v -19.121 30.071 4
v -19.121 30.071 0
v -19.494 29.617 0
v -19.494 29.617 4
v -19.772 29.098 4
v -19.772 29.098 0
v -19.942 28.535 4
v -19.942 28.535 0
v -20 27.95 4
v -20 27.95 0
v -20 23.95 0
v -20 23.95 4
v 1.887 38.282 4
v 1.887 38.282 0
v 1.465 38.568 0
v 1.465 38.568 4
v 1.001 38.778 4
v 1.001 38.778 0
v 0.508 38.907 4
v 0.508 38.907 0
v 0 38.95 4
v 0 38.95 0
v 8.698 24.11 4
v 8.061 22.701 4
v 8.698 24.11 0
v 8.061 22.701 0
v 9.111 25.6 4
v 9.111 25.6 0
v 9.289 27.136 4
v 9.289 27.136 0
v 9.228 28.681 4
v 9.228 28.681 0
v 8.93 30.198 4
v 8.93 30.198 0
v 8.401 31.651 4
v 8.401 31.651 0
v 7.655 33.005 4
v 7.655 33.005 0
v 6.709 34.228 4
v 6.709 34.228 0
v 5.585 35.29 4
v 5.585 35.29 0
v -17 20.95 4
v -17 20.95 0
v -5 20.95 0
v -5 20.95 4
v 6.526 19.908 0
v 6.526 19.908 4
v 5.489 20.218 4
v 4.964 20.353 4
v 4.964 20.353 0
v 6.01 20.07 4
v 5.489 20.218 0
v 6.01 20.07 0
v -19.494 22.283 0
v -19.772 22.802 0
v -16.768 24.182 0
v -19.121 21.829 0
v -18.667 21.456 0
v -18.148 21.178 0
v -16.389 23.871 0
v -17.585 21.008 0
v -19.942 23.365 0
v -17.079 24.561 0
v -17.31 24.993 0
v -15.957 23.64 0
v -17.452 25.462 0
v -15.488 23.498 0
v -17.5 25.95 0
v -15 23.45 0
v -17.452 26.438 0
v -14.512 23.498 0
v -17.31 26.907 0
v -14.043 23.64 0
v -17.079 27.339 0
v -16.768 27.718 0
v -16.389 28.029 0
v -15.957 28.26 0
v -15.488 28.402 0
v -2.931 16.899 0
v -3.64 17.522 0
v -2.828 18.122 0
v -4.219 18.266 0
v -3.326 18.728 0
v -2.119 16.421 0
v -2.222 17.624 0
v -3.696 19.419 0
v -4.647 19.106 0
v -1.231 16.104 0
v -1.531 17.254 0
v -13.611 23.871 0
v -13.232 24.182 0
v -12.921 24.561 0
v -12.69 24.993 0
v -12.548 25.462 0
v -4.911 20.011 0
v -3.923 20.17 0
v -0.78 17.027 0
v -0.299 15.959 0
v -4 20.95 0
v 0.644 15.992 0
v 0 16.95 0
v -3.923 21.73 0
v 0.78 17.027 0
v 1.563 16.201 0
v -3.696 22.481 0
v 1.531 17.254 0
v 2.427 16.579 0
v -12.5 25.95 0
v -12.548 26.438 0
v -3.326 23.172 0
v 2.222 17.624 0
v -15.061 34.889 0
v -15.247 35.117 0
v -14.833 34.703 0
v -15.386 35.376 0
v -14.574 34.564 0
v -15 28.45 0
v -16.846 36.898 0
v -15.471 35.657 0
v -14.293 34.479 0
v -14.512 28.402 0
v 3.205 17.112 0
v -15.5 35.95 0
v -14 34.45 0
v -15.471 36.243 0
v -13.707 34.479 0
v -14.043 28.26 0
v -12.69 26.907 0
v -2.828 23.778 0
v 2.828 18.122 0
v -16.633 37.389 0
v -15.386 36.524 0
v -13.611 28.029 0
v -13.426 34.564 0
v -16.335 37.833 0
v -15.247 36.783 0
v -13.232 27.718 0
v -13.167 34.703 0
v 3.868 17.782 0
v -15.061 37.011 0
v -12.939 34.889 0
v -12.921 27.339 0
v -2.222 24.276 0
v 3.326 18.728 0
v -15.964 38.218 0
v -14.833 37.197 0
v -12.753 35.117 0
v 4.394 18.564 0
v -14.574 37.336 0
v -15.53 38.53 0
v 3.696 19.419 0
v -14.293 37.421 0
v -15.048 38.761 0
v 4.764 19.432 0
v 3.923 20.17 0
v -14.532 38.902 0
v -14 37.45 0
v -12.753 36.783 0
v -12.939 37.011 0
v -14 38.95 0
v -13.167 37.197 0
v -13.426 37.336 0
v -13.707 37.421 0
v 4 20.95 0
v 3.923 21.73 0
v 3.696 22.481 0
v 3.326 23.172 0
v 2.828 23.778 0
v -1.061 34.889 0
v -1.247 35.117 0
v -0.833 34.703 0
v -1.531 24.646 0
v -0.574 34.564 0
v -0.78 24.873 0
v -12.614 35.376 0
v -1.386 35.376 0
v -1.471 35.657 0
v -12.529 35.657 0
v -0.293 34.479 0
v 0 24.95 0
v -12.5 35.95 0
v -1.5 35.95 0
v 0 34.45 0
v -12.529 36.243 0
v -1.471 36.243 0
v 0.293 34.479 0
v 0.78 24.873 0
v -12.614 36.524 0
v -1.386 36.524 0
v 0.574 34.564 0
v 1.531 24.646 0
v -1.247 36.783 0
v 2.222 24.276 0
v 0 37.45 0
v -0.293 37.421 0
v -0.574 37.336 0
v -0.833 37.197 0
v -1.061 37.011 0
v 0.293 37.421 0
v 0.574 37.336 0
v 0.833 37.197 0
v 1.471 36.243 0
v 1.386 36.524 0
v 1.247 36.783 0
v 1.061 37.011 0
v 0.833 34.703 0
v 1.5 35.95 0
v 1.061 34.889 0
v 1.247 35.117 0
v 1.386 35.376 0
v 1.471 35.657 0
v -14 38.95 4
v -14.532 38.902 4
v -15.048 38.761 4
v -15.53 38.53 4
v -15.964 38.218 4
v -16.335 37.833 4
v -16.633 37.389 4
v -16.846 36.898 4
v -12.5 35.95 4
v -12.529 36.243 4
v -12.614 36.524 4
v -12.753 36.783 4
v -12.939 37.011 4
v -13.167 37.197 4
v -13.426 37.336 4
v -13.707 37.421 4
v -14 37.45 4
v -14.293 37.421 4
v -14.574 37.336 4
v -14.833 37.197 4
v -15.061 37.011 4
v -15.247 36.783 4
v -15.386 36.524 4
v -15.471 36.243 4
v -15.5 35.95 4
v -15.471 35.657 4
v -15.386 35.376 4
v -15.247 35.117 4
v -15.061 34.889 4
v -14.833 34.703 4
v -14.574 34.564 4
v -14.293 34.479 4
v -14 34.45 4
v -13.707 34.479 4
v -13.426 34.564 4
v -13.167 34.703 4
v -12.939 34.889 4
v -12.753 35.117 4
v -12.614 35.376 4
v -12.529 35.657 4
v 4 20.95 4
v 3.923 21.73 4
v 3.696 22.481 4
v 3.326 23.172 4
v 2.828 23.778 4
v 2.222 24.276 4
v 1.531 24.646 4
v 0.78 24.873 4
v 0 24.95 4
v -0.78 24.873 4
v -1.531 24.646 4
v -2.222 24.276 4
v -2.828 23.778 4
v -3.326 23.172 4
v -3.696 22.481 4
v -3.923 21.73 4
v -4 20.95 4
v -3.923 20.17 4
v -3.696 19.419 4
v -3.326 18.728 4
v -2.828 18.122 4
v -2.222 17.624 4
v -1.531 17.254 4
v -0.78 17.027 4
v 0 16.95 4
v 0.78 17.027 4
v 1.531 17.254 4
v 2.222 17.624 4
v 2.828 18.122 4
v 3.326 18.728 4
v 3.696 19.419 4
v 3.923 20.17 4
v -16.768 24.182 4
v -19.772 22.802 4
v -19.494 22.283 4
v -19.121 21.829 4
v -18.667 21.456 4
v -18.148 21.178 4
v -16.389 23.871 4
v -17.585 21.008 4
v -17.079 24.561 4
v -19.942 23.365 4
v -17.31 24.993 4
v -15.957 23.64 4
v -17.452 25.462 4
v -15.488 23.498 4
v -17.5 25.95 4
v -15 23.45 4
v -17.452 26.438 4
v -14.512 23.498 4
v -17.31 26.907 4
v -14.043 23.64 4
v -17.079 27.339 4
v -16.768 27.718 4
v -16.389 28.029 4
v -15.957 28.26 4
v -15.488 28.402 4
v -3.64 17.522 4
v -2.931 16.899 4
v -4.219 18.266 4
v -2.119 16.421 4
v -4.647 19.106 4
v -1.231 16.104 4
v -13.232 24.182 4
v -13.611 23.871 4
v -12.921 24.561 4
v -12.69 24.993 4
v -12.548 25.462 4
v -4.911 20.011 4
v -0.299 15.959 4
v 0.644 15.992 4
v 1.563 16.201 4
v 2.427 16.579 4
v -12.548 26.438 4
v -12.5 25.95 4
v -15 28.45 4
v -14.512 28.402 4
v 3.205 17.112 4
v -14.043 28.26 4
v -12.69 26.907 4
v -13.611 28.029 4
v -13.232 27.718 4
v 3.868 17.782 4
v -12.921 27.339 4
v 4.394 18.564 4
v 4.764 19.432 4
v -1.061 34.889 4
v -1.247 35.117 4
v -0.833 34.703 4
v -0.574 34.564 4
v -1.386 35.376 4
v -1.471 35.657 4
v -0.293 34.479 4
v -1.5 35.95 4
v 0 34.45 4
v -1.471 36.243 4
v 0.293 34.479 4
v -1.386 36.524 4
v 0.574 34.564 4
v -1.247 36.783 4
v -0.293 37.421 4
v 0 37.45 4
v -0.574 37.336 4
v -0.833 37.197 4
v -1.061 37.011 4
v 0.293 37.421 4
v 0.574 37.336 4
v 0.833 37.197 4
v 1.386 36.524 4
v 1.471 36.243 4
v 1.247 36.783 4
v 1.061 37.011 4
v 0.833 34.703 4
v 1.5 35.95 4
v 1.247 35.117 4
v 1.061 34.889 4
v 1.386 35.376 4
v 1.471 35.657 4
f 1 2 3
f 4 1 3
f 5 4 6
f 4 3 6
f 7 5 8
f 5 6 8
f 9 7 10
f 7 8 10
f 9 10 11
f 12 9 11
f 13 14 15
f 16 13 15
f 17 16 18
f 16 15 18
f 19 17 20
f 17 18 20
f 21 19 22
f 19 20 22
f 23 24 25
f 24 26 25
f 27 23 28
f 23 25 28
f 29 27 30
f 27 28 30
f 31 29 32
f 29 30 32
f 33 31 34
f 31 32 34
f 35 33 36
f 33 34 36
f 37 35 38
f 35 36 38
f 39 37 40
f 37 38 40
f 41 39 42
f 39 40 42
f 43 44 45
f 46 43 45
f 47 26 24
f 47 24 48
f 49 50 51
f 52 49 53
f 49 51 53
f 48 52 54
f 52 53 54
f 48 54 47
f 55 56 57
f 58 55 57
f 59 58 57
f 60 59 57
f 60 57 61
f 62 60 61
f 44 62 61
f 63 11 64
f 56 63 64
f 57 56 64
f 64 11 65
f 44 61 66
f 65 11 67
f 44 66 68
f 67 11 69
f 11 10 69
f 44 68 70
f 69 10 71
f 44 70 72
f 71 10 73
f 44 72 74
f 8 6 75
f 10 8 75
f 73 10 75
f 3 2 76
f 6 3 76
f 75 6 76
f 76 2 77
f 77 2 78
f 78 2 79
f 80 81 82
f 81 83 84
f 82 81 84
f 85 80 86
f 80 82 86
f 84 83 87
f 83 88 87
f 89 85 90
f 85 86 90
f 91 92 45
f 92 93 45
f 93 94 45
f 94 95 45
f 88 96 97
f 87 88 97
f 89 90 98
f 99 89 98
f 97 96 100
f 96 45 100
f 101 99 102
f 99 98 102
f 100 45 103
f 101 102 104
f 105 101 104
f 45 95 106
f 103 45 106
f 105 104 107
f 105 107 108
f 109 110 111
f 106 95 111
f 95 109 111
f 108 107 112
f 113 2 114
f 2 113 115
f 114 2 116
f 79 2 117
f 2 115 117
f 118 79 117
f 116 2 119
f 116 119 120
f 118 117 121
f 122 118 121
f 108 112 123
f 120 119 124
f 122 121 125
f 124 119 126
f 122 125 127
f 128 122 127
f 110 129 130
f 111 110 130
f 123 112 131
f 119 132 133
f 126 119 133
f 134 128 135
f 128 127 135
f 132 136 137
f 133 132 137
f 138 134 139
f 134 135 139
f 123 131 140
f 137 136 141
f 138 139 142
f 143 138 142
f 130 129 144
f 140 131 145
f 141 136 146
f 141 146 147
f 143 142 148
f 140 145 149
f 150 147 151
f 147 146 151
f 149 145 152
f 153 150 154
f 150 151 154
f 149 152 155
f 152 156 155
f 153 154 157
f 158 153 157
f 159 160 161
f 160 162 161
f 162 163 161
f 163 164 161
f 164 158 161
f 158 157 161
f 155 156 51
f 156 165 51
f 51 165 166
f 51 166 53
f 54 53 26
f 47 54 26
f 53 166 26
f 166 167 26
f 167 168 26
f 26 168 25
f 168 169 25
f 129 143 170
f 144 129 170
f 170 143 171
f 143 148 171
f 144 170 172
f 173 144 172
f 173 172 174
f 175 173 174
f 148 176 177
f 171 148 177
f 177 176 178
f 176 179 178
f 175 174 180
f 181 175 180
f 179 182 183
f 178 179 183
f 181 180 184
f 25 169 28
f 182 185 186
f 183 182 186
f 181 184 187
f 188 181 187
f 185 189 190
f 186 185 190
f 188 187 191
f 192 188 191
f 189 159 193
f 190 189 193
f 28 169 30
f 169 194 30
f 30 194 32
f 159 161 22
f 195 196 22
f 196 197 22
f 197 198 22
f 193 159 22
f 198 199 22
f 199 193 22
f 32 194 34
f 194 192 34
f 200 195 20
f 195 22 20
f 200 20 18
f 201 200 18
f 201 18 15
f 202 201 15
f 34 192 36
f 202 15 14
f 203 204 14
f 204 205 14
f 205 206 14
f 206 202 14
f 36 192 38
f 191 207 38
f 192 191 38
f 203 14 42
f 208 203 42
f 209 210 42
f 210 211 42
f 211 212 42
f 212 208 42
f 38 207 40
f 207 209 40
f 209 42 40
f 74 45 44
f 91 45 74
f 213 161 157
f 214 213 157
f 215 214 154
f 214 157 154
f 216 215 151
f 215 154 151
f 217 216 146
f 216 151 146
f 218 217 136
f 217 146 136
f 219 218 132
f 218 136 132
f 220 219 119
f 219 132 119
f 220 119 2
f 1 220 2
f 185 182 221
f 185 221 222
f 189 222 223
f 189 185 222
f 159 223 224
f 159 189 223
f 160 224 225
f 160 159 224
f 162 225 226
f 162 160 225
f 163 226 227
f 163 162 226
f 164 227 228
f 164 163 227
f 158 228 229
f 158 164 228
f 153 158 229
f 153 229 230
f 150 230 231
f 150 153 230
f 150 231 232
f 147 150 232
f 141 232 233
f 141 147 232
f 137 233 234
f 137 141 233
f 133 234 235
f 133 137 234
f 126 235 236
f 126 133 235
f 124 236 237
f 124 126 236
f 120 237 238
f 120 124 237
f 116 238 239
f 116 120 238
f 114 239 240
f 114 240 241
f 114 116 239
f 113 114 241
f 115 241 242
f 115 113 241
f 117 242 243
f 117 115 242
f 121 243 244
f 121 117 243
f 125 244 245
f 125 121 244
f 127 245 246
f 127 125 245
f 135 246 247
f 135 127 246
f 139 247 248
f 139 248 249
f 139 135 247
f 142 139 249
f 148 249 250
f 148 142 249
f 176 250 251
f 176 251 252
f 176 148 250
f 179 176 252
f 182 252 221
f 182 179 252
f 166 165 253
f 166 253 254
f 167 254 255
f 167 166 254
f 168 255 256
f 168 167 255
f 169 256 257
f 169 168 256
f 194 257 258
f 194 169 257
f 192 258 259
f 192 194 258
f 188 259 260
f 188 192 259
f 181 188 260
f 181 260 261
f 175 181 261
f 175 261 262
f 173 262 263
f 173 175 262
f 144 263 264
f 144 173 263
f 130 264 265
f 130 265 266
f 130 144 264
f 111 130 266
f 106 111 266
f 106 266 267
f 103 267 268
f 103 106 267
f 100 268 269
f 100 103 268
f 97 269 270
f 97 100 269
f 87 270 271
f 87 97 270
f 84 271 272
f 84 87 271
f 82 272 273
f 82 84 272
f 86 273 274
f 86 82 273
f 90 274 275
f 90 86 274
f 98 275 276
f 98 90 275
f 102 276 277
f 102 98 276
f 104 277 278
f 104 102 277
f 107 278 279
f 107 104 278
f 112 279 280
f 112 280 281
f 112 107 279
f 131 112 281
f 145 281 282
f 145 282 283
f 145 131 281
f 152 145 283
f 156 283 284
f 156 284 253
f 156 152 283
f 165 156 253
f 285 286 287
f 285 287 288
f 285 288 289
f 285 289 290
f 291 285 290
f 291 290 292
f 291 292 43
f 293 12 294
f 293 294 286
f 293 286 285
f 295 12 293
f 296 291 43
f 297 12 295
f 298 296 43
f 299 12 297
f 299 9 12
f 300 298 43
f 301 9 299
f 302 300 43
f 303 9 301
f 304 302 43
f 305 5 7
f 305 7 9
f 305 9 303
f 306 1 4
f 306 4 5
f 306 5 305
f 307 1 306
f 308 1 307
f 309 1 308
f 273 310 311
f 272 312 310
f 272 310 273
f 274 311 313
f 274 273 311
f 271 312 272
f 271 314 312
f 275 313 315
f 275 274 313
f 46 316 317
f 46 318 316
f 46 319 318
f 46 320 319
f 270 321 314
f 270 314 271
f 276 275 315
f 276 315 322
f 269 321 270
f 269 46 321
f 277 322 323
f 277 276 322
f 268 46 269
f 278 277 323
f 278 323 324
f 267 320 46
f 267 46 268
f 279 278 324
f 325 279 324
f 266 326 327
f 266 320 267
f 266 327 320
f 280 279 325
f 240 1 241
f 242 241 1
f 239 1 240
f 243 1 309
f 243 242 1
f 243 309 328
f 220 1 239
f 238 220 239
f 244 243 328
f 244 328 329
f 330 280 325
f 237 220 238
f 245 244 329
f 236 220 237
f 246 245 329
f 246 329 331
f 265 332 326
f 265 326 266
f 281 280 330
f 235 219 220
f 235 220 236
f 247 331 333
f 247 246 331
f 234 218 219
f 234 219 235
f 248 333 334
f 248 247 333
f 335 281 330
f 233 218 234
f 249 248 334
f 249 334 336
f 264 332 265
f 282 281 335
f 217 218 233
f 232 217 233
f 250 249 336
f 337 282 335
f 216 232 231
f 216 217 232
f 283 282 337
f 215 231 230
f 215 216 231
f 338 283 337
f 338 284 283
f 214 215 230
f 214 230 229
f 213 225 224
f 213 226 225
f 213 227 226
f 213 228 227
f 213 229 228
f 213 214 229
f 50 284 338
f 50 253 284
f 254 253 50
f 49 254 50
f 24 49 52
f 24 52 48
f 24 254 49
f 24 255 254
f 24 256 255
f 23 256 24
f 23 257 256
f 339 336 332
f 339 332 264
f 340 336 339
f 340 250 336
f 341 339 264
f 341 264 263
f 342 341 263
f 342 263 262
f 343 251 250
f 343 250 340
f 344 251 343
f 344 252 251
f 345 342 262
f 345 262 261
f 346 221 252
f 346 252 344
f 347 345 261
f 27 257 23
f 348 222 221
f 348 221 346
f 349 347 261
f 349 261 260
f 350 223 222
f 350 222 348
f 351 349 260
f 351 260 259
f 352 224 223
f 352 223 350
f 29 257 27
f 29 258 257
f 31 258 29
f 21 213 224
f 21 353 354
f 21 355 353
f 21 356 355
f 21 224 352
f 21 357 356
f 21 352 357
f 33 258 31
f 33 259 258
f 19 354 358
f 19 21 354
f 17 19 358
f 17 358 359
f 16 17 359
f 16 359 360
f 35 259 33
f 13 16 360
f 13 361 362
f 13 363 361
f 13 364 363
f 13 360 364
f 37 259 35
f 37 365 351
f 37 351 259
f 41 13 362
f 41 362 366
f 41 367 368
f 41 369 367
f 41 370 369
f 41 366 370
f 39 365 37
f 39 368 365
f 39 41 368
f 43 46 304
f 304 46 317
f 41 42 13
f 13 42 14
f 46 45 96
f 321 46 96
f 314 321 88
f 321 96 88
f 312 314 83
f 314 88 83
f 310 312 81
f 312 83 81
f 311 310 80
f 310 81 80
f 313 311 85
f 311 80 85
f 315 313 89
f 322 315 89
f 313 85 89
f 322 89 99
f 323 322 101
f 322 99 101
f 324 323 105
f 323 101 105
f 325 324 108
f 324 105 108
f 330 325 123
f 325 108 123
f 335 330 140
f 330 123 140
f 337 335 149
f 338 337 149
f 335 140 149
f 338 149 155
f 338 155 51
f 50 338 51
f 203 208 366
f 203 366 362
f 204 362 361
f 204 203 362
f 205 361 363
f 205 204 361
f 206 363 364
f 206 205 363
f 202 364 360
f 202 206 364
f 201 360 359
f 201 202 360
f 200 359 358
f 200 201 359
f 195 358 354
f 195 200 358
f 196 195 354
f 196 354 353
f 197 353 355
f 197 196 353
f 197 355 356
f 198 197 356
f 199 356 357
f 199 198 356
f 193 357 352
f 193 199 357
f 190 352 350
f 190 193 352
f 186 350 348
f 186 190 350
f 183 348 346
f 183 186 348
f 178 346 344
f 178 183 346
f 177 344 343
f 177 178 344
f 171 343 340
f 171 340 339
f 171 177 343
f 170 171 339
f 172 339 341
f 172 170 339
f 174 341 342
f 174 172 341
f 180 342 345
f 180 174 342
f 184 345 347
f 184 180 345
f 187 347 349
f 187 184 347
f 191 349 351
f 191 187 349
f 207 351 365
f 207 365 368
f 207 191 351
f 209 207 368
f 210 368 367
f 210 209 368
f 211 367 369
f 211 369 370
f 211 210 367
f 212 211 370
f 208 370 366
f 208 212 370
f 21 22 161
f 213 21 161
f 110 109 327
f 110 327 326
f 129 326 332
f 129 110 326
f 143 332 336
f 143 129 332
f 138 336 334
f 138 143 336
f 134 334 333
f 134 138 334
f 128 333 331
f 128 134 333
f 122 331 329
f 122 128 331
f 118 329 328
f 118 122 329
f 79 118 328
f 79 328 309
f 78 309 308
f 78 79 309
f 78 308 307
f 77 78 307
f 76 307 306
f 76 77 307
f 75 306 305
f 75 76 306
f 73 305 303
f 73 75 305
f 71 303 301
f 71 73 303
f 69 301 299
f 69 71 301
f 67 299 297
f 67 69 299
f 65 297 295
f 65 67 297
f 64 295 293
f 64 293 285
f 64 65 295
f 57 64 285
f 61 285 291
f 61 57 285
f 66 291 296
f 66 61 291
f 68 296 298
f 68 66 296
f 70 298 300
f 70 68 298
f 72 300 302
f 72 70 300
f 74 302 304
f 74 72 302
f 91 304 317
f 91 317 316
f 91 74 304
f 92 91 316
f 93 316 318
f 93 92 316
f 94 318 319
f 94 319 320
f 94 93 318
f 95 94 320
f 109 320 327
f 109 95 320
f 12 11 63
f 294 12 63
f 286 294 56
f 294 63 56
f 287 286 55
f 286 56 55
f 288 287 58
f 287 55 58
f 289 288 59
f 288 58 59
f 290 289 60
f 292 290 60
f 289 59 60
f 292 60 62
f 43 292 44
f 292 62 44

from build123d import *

# Parameters (mm, degrees)
CROQUIS1_R              = 4
CROQUIS1_R_2            = 2.5
CROQUIS1_R_3            = 1.5
SALIENTE_EXTRUIR1_DEPTH = 4
CORTAR_EXTRUIR1_DEPTH   = 10
REDONDEO1_R             = 10


with BuildPart() as part:
    # Croquis1 → Saliente-Extruir1 (new body)
    with BuildSketch(Plane.XY):
        with BuildLine():
            ThreePointArc((13.175908043, 16.287969402), (20.207859701, 17.03070481), (19.465124293, 24.062656467))
            Line((19.465124293, 24.062656467), (1.886764875, 38.28240612))
            ThreePointArc((1.886764875, 38.28240612), (1.000695169, 38.778181249), (0, 38.95))
            Line((0, 38.95), (-14, 38.95))
            ThreePointArc((-14, 38.95), (-15.75421382, 38.383666755), (-16.84611457, 36.898489248))
            Line((-16.84611457, 36.898489248), (-19.121320344, 30.071320344))
            ThreePointArc((-19.121320344, 30.071320344), (-19.771638598, 29.098050297), (-20, 27.95))
            Line((-20, 27.95), (-20, 23.95))
            ThreePointArc((-20, 23.95), (-19.121320344, 21.828679656), (-17, 20.95))
            Line((-17, 20.95), (-5, 20.95))
            ThreePointArc((-5, 20.95), (-0.298863721, 15.958939945), (4.964272191, 20.353341289))
            ThreePointArc((4.964272191, 20.353341289), (9.295071106, 18.775093958), (13.175908043, 16.287969402))
        make_face()
        with Locations((0, 20.95)):
            Circle(CROQUIS1_R, mode=Mode.SUBTRACT)
        with Locations((-15, 25.95)):
            Circle(CROQUIS1_R_2, mode=Mode.SUBTRACT)
        with Locations((0, 35.95)):
            Circle(CROQUIS1_R_3, mode=Mode.SUBTRACT)
        with Locations((-14, 35.95)):
            Circle(CROQUIS1_R_3, mode=Mode.SUBTRACT)
    extrude(amount=SALIENTE_EXTRUIR1_DEPTH)

    # Croquis2 → Cortar-Extruir1 (cut)
    with BuildSketch(Plane.XY.offset(4)):
        with BuildLine():
            Line((12.087138576, 30.030967124), (6.52630373, 19.907532736))
            ThreePointArc((6.52630373, 19.907532736), (10.015967096, 18.400622357), (13.175908043, 16.287969402))
            ThreePointArc((13.175908043, 16.287969402), (20.207859701, 17.03070481), (19.465124293, 24.062656467))
            Line((19.465124293, 24.062656467), (12.087138576, 30.030967124))
        make_face()
    extrude(amount=-CORTAR_EXTRUIR1_DEPTH, mode=Mode.SUBTRACT)

    # Redondeo1
    redondeo1_edges = [part.edges().sort_by_distance(p)[0] for p in [
        (12.087138576, 30.030967124, 2),
    ]]
    fillet(redondeo1_edges, radius=REDONDEO1_R)


solid = part.part
